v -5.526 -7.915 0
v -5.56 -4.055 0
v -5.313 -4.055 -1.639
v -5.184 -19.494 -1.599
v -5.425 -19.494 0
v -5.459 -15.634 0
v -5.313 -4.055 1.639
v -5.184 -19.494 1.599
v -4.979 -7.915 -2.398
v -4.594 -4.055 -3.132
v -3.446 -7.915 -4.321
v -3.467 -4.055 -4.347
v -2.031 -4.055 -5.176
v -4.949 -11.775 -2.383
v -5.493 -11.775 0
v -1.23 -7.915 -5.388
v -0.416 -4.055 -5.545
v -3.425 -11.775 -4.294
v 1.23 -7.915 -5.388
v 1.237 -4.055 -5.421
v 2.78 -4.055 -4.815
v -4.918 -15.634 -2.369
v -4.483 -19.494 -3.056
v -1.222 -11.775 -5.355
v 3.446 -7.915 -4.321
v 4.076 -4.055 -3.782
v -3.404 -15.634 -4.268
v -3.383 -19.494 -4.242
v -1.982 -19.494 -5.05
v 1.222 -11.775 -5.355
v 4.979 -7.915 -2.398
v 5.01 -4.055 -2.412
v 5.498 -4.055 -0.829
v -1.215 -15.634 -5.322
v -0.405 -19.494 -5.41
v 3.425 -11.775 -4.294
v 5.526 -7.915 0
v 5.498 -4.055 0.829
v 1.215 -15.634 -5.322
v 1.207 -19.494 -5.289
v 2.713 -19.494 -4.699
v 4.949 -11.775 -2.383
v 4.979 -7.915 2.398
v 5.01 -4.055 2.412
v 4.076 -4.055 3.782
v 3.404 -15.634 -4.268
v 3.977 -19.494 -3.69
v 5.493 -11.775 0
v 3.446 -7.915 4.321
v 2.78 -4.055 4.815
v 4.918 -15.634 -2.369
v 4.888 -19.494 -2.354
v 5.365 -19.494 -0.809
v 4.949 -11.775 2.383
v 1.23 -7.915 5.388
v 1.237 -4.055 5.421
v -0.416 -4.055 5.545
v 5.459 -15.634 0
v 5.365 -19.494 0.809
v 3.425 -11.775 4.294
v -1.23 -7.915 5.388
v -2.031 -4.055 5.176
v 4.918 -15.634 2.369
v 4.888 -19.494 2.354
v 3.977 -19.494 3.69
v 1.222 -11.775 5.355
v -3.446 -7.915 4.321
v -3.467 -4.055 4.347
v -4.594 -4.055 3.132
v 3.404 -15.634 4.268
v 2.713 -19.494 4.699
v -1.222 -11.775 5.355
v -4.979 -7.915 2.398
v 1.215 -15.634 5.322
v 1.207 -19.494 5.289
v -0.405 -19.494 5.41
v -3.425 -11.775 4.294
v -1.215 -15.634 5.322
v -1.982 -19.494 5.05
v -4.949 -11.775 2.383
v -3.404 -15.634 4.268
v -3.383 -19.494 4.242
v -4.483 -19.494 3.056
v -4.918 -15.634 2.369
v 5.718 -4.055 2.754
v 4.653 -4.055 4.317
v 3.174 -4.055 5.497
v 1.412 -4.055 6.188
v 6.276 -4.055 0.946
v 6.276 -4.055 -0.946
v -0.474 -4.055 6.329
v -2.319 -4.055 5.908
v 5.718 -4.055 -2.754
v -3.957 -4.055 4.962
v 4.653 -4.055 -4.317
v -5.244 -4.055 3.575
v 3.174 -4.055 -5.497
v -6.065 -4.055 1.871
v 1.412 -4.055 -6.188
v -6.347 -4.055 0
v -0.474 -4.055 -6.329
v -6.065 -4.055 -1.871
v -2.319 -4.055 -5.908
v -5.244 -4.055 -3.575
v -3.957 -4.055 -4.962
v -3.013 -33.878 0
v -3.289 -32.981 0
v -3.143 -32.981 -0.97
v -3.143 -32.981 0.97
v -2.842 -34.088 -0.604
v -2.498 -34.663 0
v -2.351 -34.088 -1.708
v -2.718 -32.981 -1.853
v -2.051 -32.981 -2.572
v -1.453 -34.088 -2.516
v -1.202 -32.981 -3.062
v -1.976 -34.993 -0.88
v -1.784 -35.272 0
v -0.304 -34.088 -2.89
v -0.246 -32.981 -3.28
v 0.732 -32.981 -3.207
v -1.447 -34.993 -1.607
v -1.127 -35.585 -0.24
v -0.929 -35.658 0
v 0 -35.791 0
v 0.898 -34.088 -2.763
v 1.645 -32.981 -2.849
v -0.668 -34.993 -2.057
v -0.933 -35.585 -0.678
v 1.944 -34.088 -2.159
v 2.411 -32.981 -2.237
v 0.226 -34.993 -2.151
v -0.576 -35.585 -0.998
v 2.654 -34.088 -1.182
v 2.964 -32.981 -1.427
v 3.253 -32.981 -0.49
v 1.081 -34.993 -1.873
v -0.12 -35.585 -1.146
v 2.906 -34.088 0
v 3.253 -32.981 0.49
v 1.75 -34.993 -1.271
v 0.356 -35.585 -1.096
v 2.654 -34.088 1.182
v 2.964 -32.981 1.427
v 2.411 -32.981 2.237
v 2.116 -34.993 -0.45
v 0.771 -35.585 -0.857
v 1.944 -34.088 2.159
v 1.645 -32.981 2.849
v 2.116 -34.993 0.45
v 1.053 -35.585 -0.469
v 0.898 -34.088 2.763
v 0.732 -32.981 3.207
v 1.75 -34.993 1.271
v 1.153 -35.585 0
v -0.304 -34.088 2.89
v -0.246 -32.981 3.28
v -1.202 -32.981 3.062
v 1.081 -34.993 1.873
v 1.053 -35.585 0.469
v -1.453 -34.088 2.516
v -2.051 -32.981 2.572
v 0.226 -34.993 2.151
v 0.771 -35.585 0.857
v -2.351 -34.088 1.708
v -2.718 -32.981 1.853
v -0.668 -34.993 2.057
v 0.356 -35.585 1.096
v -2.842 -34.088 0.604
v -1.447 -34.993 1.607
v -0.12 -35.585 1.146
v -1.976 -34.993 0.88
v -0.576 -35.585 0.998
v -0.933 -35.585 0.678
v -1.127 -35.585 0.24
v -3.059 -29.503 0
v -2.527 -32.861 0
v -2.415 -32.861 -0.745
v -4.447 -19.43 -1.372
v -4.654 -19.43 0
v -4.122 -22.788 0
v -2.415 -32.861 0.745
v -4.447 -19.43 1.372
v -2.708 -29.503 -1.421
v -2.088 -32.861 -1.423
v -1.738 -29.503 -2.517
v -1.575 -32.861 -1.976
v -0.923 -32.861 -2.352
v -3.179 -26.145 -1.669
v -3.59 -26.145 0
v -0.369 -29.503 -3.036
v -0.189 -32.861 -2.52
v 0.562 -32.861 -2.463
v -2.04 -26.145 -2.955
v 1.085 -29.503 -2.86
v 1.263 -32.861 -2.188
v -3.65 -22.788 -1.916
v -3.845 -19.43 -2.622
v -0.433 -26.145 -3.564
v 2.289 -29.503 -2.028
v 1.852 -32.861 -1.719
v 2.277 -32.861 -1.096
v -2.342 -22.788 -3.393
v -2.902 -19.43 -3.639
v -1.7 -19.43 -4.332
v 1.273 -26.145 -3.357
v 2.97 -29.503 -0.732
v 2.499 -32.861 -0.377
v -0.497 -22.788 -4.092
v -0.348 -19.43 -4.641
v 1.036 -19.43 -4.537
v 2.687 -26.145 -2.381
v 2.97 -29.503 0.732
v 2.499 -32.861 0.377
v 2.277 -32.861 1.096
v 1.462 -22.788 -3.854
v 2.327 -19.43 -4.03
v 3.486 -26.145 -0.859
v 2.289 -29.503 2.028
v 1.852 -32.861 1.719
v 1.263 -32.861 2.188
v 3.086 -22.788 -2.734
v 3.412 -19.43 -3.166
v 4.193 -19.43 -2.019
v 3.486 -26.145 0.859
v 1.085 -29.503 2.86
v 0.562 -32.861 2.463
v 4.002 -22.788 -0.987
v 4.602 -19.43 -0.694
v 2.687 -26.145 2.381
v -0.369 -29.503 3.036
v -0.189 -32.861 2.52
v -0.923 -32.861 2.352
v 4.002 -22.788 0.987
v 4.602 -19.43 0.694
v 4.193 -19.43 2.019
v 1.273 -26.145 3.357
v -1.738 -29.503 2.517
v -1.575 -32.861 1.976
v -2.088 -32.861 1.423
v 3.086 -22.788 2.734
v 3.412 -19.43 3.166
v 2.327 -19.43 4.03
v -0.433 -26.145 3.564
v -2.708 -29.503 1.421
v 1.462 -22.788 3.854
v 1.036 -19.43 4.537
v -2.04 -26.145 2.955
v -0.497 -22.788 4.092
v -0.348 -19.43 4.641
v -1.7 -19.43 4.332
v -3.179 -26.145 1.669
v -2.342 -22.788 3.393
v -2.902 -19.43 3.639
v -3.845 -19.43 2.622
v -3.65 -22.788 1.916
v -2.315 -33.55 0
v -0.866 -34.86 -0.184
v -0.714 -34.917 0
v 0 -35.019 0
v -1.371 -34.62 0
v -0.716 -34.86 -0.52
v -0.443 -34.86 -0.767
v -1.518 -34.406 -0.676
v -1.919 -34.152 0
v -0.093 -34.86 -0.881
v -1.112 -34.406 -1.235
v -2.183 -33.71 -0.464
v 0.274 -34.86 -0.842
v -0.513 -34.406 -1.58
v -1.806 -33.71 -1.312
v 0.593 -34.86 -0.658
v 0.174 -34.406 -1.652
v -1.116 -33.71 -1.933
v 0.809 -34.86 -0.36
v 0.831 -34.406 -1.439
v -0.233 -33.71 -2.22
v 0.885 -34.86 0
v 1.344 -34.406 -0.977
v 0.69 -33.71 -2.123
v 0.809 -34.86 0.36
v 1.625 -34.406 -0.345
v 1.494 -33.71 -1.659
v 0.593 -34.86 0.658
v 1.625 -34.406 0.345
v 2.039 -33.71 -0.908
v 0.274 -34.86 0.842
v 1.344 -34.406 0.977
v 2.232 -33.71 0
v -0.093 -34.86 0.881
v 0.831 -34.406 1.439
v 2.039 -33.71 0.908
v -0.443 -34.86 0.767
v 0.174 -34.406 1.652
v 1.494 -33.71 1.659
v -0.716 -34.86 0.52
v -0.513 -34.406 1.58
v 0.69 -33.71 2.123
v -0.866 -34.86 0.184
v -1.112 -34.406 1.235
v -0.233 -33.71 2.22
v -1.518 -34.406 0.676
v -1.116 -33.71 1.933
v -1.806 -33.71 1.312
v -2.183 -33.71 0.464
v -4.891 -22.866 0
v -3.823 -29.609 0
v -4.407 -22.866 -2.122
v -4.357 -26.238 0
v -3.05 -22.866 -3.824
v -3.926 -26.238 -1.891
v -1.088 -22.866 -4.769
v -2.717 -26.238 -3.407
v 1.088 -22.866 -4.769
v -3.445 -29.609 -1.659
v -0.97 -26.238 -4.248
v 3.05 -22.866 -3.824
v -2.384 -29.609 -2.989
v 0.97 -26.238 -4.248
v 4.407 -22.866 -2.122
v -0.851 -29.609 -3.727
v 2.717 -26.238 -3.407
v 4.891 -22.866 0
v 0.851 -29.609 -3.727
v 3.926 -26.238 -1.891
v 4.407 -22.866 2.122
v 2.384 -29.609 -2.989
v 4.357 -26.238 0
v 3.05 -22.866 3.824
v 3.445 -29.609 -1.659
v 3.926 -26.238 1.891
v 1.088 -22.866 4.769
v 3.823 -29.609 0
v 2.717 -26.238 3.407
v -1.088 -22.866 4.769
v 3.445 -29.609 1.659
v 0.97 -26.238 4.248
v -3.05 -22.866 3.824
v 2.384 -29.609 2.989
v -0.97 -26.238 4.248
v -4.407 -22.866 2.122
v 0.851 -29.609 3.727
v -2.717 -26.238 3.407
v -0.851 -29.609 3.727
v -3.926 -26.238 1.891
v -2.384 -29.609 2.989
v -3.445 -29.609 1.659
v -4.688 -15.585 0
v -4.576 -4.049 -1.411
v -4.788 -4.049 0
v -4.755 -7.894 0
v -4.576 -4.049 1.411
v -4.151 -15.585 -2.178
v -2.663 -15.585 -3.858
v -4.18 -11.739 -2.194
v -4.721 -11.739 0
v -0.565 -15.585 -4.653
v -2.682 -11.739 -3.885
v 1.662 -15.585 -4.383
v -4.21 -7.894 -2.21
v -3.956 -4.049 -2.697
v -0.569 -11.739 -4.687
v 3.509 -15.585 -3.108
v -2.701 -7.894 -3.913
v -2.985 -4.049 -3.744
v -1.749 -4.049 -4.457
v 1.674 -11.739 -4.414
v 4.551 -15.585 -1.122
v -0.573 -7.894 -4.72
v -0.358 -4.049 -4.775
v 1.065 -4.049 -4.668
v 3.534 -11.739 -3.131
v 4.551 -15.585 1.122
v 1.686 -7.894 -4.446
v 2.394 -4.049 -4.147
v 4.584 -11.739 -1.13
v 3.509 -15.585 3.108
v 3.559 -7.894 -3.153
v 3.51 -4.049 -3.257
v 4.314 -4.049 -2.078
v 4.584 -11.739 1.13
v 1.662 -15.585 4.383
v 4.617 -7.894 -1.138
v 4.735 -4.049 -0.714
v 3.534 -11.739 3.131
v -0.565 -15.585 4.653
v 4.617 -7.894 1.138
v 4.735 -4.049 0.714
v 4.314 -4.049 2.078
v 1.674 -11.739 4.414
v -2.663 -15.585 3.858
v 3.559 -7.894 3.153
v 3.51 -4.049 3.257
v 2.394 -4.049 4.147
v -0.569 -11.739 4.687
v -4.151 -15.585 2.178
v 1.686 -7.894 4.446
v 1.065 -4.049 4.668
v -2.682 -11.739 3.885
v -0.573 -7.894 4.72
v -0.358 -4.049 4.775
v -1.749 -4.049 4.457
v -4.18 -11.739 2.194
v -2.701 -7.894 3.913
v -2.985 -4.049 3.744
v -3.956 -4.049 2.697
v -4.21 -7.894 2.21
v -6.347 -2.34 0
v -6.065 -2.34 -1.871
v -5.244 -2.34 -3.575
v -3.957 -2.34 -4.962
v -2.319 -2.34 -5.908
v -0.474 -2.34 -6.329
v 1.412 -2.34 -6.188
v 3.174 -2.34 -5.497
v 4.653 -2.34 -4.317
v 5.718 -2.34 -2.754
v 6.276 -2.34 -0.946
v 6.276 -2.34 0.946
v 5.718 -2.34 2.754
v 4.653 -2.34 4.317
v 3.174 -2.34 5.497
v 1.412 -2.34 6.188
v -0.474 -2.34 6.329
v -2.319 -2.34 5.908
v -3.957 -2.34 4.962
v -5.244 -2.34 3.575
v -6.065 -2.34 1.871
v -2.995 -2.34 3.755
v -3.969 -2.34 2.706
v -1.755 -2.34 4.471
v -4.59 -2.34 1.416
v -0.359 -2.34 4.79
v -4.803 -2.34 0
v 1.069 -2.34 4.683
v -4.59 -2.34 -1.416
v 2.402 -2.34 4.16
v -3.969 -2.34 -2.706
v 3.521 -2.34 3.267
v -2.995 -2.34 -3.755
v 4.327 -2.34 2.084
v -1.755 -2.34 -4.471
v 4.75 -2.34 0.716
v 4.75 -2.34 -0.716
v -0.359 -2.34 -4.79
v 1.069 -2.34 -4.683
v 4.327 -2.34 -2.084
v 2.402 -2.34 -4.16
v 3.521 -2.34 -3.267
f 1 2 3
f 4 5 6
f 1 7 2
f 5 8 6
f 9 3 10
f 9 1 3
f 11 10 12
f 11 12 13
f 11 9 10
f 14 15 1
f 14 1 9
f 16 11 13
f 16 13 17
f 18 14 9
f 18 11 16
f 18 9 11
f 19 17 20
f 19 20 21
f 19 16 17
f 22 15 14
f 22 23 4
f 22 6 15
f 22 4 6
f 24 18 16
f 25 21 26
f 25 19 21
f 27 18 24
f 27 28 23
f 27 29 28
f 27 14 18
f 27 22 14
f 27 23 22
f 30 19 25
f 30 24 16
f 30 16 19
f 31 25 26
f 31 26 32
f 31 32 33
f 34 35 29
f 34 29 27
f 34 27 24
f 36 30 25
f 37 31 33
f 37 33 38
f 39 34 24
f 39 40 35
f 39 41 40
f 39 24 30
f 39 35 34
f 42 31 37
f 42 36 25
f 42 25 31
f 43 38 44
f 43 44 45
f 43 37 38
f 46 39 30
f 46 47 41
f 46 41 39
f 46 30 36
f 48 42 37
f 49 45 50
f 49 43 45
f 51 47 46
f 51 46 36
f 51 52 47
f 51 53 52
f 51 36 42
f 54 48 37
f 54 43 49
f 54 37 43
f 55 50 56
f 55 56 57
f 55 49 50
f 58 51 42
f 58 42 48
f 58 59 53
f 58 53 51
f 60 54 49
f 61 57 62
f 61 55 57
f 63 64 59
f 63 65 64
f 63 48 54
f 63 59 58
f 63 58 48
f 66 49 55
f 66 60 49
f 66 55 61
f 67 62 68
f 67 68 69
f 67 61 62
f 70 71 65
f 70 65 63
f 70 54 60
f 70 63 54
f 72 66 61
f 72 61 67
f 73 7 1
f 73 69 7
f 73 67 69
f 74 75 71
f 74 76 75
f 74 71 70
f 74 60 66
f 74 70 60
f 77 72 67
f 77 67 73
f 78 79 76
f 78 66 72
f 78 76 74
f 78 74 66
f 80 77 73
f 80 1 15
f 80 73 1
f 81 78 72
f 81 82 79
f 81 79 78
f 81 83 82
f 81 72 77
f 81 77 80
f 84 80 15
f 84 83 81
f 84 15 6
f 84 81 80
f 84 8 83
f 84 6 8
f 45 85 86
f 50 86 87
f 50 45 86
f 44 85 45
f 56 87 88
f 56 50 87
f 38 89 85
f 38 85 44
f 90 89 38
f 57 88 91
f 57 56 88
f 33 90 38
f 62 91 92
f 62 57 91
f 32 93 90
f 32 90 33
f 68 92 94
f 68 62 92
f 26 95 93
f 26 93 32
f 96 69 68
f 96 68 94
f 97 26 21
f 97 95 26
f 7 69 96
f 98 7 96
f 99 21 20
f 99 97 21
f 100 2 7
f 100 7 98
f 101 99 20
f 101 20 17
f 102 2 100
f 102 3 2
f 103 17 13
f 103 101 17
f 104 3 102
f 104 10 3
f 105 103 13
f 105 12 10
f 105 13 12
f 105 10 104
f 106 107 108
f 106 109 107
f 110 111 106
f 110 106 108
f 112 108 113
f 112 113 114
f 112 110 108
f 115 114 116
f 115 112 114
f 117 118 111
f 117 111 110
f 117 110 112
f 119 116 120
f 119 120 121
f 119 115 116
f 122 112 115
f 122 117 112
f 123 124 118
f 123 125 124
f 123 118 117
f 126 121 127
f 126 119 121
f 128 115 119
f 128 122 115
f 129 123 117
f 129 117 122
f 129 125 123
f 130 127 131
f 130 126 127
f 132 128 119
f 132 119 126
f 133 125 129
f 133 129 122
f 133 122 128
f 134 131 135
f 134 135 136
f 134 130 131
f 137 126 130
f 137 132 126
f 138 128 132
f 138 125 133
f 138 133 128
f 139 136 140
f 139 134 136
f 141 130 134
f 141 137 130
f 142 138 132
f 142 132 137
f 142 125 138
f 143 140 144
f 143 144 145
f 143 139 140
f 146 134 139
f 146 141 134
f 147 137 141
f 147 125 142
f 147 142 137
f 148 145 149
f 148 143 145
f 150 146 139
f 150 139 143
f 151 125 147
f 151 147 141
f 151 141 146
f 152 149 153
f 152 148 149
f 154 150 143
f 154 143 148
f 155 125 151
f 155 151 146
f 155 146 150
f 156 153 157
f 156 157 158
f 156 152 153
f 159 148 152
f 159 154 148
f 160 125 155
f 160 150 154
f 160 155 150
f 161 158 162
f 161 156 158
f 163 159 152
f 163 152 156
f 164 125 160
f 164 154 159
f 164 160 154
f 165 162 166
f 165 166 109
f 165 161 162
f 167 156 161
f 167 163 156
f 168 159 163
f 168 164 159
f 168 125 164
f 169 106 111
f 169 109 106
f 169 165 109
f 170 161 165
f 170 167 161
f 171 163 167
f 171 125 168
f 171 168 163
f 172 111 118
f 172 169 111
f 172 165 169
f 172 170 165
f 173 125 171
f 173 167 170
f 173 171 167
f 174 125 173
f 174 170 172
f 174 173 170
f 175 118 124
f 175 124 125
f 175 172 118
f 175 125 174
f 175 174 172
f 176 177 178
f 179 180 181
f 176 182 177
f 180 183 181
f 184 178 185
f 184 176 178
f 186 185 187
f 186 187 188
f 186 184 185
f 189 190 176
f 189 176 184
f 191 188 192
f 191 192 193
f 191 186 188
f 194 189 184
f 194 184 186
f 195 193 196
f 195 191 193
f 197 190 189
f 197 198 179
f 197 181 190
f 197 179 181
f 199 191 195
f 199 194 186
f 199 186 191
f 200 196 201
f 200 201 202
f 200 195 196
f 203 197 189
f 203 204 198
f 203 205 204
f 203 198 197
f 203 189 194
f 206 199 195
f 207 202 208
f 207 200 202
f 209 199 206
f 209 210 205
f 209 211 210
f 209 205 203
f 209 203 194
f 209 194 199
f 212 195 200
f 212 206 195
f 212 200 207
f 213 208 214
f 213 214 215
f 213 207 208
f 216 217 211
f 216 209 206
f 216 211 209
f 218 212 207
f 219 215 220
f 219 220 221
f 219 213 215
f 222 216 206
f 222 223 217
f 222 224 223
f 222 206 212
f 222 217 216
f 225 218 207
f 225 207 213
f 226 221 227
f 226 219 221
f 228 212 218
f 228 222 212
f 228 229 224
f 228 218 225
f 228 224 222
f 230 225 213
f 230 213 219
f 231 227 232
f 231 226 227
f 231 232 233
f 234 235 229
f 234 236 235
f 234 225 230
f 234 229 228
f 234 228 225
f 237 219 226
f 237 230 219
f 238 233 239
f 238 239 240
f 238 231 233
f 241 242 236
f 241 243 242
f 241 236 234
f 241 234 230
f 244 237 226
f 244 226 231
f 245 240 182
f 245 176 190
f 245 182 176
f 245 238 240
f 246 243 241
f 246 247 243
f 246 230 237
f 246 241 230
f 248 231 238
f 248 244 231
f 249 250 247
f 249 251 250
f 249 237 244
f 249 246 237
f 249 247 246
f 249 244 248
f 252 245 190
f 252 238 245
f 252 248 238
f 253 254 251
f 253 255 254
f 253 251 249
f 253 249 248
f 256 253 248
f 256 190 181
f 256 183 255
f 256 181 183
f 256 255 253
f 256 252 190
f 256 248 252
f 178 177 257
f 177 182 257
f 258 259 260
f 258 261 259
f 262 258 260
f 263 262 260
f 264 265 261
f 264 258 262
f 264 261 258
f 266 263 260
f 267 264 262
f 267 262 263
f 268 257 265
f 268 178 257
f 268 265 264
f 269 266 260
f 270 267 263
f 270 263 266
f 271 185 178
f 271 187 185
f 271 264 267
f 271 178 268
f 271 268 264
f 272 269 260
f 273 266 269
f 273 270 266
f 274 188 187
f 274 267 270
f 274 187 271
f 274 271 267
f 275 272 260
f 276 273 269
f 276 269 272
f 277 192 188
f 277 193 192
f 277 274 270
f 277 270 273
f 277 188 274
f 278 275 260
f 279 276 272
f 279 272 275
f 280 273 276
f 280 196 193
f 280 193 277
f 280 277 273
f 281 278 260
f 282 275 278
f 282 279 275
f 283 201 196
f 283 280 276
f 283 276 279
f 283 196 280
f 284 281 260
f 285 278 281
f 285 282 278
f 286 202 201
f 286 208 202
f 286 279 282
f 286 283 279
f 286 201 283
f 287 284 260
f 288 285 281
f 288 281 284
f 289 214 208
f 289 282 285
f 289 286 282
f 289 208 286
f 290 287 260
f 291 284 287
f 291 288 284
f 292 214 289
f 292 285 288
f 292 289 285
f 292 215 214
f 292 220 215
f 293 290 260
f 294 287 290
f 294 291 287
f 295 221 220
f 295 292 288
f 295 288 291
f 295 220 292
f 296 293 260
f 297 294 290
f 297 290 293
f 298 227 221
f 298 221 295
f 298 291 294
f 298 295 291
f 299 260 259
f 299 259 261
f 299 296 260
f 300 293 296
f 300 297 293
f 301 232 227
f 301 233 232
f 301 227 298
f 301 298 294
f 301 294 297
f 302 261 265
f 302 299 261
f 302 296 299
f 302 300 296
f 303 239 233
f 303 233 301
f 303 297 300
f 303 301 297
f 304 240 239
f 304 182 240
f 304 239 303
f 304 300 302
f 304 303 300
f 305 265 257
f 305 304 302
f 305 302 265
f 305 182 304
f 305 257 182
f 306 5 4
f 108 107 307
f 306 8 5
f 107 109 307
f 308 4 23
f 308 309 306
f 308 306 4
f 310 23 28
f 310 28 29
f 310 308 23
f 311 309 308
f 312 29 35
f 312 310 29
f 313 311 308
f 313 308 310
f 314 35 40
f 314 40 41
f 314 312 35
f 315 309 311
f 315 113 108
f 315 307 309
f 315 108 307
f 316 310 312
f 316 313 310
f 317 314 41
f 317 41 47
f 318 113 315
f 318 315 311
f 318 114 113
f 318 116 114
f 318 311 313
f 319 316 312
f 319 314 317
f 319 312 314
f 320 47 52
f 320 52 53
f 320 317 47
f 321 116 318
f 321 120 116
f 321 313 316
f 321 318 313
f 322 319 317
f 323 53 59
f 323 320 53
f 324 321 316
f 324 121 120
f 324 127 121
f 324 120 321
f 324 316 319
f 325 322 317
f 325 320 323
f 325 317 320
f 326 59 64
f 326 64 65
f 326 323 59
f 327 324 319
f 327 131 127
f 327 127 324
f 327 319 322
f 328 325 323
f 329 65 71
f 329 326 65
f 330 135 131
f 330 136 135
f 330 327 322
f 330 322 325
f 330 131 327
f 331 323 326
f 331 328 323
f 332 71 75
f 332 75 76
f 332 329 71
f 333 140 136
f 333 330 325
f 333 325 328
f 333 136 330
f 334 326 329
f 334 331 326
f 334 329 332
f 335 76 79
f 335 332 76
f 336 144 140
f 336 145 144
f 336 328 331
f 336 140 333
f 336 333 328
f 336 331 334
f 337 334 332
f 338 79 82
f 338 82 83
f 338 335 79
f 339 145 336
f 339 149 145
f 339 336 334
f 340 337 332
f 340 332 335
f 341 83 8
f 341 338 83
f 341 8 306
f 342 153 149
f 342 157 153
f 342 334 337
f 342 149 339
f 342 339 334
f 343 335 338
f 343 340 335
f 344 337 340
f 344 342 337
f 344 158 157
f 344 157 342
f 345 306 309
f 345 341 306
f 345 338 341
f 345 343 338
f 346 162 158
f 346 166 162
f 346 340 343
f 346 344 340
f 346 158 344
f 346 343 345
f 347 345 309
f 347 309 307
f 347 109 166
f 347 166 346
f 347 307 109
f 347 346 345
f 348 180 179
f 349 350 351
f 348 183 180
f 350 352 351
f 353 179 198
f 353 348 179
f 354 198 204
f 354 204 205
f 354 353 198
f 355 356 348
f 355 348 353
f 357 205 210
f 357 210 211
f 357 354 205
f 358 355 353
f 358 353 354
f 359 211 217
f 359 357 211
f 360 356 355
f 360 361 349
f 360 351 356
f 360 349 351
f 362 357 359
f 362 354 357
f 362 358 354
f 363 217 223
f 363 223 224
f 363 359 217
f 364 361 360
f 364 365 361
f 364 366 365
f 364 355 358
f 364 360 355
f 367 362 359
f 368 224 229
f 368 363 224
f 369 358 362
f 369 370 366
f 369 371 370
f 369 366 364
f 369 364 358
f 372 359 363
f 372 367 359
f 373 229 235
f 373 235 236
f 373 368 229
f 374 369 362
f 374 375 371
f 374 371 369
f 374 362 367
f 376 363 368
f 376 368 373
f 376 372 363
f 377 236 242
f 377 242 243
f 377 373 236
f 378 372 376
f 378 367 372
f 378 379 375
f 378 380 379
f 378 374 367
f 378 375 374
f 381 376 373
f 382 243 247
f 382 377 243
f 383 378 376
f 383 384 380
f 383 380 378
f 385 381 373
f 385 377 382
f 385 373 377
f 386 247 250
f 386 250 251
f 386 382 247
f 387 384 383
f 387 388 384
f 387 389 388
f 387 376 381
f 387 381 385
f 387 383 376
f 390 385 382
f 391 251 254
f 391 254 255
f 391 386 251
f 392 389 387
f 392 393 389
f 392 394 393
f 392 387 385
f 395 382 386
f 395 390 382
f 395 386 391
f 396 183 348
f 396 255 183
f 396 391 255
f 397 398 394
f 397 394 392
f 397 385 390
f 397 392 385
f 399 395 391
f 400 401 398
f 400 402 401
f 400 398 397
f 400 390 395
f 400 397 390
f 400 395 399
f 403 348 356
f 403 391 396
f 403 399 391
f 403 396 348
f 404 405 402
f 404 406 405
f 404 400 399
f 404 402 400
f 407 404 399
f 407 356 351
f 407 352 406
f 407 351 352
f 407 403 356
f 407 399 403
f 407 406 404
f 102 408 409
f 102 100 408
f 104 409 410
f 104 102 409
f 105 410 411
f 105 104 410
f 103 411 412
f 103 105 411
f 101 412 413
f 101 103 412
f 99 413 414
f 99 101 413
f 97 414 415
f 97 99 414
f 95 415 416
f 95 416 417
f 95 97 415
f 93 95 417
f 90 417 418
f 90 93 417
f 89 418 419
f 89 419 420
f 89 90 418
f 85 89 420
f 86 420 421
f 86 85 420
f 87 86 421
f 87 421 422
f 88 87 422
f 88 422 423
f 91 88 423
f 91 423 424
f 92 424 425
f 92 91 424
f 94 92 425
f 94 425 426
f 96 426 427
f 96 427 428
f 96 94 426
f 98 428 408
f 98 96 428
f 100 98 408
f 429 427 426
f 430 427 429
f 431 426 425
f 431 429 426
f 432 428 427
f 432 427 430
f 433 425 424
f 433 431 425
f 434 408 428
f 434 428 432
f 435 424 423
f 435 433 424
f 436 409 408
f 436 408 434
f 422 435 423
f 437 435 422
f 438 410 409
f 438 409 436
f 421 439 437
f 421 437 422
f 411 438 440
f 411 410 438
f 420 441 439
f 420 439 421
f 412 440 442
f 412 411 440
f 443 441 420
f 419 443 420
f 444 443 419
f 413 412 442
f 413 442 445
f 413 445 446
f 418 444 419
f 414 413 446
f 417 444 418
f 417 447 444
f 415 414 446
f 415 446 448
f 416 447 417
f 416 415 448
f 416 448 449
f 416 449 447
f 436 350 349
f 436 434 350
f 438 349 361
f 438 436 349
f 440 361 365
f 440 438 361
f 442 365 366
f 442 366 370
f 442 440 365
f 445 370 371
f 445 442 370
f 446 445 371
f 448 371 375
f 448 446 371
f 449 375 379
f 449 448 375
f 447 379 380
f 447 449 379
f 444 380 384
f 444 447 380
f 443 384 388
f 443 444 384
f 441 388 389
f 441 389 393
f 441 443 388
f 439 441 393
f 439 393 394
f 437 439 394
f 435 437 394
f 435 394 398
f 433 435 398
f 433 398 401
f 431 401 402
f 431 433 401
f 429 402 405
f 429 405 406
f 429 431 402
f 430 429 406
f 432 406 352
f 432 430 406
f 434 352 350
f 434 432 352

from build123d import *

# Parameters (mm, degrees)
SCALE1_SCALE = 0.85770751


with BuildPart() as part:
    # Sketch1 → Revolve25 (revolve)
    with BuildSketch(Plane.XY):
        with BuildLine():
            Line((-5.582614804, -1.992146118), (-5.6, 0))
            Line((-5.6, 0), (-7.4, 0))
            Line((-7.4, 0), (-7.4, -2))
            Line((-7.4, -2), (-6.482580535, -2))
            Line((-6.482580535, -2), (-6.325496915, -20))
            Line((-6.325496915, -20), (-3.834959356, -35.724635285))
            ThreePointArc((-3.834959356, -35.724635285), (-2.521652597, -38.069713242), (0, -39))
            Line((0, -39), (0, -38.1))
            ThreePointArc((0, -38.1), (-1.937149354, -37.385347873), (-2.946039849, -35.583844266))
            Line((-2.946039849, -35.583844266), (-5.426114828, -19.925267112))
            Line((-5.426114828, -19.925267112), (-5.582614804, -1.992146118))
        make_face()
    revolve(axis=Axis((0, 0, 0), (0, -1, 0)))


with BuildPart() as part_1:
    # Scale1: scaled about (0, -16.444791582, 0)
    add(part.part.scale(SCALE1_SCALE).moved(Location((0, -2.339970344, 0))))


solid = part_1.part
